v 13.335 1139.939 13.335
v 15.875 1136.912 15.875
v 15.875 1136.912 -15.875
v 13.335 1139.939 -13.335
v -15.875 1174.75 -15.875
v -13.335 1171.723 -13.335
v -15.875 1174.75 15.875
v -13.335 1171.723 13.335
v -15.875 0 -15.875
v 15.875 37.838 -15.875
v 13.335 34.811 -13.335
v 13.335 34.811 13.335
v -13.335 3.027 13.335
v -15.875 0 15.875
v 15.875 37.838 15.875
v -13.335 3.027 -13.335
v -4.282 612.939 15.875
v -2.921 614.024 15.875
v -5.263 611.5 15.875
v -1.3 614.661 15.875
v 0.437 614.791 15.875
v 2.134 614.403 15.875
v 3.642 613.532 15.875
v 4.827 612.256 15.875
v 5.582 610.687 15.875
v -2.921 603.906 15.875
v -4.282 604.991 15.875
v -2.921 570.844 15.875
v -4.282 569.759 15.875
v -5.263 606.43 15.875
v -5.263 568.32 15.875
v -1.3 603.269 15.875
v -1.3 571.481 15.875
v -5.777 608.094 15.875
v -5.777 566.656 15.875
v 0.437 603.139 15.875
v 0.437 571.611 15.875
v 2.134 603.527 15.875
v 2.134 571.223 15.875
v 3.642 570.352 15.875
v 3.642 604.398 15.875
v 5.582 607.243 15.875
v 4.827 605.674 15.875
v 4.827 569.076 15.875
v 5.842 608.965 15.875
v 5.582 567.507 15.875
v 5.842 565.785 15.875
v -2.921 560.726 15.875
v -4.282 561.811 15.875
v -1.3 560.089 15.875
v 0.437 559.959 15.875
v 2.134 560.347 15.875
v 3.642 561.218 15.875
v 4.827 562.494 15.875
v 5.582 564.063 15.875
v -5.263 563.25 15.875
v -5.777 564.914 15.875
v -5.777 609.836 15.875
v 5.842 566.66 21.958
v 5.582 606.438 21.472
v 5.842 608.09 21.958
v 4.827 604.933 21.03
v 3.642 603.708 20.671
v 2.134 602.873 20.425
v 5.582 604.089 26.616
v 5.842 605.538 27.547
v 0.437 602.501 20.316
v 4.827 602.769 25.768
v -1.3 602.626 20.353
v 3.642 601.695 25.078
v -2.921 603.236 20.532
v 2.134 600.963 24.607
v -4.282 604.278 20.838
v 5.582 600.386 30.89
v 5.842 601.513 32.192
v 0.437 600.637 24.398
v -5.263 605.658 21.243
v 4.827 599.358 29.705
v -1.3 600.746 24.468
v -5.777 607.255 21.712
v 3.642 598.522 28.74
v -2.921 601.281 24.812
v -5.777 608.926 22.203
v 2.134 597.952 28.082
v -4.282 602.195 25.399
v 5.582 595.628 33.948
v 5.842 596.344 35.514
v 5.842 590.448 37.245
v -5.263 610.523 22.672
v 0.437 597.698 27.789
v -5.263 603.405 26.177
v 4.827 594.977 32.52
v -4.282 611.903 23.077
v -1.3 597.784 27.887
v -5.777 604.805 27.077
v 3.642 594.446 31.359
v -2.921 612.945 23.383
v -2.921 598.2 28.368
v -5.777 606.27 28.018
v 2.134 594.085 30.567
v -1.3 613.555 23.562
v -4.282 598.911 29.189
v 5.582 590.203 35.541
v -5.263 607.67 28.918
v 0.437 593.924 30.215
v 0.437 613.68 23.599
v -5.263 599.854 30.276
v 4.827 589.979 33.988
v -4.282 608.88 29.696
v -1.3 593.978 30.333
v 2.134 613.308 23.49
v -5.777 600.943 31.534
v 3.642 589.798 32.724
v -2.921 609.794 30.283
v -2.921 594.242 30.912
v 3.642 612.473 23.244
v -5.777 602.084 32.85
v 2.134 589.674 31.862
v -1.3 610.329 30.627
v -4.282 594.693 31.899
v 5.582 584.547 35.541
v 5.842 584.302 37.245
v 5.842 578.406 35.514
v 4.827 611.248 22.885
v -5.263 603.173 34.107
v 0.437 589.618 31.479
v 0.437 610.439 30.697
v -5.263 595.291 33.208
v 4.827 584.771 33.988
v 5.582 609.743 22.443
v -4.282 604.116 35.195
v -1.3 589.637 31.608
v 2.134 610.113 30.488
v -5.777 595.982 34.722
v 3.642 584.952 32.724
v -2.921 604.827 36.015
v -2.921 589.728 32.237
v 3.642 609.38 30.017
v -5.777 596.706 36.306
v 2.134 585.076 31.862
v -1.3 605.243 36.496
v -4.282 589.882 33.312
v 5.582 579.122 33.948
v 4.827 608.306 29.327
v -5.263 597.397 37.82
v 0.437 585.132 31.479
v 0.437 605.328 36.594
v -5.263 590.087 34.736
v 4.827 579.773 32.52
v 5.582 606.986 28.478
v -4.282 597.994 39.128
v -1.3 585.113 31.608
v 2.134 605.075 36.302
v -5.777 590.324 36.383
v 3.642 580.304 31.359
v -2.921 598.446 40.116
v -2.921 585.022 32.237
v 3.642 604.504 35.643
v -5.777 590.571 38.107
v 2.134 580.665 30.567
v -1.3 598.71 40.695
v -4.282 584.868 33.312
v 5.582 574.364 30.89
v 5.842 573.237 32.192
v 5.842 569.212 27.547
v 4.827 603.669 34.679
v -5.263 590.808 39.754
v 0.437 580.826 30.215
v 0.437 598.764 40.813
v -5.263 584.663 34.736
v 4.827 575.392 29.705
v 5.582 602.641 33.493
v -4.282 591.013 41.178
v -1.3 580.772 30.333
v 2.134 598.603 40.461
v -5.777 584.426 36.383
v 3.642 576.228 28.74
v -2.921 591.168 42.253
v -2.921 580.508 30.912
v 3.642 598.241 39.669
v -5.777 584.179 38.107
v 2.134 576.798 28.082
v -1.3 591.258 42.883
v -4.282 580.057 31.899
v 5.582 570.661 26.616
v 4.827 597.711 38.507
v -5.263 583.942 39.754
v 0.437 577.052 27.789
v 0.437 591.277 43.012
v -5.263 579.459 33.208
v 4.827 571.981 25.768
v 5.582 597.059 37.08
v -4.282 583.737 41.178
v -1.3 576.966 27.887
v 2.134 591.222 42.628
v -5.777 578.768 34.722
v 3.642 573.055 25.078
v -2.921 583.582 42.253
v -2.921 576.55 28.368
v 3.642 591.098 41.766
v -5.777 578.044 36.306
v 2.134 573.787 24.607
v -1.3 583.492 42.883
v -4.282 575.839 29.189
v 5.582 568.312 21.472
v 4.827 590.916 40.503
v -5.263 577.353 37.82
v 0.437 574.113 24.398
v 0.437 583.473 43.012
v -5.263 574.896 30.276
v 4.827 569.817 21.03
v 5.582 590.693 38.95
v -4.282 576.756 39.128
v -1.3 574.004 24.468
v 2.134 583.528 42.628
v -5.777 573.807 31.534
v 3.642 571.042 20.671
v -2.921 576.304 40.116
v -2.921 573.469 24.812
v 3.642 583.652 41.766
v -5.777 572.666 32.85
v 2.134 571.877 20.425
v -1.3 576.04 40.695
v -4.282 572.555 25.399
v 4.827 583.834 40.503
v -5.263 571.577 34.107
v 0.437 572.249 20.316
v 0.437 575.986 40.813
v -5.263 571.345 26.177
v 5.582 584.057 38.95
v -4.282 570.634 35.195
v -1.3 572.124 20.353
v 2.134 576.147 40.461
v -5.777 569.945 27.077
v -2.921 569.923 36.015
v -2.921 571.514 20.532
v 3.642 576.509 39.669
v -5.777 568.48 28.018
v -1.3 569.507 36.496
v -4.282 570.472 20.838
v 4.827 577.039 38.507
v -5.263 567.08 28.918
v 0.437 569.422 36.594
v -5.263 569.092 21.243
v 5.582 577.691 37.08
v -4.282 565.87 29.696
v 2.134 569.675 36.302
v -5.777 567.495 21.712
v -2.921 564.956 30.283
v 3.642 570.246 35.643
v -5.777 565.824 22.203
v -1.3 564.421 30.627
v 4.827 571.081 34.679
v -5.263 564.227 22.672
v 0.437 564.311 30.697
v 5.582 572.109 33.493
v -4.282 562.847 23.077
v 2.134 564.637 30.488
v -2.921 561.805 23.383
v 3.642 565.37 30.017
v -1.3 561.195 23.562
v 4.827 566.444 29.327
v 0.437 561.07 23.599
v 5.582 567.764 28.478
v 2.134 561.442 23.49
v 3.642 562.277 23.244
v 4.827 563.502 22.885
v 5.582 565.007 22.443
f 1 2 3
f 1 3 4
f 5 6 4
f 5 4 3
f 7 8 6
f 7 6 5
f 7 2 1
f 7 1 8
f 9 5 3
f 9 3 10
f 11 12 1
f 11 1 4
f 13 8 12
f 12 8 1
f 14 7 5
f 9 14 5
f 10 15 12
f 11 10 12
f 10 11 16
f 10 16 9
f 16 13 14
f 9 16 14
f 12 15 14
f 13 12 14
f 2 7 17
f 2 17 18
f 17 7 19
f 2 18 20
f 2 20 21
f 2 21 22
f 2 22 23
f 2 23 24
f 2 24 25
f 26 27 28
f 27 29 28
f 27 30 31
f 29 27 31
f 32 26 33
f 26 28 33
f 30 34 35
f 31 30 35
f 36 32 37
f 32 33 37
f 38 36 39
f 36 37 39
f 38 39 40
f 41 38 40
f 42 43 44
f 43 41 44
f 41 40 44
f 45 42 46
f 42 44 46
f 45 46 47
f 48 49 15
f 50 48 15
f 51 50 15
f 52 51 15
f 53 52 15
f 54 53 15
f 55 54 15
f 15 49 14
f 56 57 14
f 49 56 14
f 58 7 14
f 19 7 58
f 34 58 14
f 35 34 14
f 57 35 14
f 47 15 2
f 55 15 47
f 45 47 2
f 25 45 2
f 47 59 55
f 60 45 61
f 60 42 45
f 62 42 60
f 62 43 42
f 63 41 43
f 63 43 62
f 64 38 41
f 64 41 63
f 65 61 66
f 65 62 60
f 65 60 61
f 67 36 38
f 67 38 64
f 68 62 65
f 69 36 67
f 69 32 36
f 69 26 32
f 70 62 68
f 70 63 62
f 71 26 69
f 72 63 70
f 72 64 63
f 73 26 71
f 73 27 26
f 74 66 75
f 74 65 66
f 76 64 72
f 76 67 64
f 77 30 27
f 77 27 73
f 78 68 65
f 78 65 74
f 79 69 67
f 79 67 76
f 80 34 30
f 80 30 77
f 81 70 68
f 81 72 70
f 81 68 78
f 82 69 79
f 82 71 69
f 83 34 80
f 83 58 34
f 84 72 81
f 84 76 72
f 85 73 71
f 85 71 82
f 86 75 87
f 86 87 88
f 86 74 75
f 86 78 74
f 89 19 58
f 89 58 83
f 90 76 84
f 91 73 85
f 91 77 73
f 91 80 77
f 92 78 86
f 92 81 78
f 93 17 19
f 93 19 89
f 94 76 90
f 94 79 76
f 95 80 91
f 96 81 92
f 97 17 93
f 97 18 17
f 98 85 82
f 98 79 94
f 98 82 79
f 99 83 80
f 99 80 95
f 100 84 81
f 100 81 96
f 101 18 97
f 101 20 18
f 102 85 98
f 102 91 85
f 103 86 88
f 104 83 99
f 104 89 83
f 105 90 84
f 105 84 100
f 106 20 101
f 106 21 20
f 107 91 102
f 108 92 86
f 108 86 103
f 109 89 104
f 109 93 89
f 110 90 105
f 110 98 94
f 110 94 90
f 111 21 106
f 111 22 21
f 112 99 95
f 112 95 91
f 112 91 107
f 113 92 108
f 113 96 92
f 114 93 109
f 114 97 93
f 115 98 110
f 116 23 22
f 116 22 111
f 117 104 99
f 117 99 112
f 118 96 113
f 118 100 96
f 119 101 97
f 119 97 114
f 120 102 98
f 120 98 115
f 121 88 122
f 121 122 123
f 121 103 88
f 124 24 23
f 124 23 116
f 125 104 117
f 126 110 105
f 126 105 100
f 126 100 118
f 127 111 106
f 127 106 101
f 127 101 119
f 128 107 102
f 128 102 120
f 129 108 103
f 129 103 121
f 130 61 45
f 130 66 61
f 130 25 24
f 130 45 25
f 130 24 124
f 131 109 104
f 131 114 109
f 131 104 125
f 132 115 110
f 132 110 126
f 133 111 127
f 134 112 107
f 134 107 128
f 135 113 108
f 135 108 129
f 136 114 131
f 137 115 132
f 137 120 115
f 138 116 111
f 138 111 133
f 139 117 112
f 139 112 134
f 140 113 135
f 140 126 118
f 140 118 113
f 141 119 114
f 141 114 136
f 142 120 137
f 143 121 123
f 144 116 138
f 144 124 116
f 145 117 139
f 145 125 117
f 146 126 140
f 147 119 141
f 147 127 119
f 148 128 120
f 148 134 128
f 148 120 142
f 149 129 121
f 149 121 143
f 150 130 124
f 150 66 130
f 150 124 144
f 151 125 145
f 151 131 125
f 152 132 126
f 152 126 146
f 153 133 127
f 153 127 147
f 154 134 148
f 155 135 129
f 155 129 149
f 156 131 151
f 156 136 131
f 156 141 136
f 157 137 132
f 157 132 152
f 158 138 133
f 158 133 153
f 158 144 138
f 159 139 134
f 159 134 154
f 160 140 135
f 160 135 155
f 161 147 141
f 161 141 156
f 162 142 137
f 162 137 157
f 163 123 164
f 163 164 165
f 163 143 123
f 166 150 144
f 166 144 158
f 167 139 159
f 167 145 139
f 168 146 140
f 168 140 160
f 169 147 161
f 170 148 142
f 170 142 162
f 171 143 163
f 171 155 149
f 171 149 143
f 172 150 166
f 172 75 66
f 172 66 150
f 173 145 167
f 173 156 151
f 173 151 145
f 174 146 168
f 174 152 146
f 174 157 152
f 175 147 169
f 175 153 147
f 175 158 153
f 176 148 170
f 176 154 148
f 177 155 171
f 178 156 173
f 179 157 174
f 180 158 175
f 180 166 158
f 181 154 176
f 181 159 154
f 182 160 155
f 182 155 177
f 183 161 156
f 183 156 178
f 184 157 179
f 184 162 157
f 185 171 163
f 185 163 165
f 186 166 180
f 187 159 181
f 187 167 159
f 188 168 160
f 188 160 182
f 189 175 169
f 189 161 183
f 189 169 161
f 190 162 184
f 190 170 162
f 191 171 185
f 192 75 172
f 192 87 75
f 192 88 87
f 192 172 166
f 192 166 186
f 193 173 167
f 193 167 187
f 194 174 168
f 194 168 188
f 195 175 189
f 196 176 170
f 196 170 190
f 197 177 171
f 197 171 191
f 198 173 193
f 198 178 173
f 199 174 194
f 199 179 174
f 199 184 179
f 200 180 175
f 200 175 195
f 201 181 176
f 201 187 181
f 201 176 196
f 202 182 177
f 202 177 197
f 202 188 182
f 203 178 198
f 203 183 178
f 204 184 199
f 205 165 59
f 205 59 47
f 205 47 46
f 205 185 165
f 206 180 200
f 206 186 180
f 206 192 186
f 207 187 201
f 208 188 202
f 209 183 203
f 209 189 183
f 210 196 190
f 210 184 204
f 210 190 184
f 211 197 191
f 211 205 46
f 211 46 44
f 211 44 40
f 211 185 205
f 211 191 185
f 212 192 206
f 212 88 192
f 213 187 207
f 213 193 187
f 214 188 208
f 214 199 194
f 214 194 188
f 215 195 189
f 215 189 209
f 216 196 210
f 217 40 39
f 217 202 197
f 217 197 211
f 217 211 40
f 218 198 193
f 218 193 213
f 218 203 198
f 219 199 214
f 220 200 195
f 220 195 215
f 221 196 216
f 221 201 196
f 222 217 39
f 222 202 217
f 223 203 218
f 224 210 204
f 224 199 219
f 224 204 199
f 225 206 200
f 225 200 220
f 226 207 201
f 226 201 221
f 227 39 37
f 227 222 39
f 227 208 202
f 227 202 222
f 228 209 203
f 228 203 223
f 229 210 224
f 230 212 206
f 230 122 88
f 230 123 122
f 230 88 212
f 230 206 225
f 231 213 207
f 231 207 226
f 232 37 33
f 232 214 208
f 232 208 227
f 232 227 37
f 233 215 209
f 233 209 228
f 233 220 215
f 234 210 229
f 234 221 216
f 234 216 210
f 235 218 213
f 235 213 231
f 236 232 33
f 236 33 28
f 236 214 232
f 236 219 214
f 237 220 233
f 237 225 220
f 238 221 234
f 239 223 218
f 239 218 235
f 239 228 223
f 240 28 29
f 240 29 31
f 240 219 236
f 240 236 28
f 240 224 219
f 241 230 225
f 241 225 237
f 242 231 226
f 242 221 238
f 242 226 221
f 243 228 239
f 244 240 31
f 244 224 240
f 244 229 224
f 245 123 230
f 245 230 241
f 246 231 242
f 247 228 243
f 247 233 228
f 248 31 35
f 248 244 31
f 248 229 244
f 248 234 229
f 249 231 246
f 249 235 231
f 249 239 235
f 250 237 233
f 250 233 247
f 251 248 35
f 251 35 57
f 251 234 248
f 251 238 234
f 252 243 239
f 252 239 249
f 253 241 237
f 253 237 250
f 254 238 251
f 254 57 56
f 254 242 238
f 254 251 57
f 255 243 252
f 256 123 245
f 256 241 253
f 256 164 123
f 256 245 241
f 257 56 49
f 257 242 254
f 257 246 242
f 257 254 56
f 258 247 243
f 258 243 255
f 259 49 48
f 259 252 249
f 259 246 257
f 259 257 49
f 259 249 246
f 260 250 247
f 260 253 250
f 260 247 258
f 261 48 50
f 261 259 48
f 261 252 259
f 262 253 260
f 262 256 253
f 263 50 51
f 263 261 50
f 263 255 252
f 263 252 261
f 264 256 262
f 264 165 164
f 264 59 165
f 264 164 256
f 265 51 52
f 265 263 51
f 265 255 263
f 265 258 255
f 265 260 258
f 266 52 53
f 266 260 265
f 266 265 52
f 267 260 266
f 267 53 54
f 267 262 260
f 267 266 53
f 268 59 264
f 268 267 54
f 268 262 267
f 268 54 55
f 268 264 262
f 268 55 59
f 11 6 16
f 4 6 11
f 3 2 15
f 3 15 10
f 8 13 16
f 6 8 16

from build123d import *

# Parameters (mm, degrees)
SKETCH2_W           = 31.75
SKETCH2_H           = 31.75
SKETCH2_W_2         = 26.67
SKETCH2_H_2         = 26.67
BOSS_EXTRUDE1_DEPTH = 1174.75
CUT_EXTRUDE1_DEPTH  = 1176.286195199
SKETCH8_R           = 5.842


with BuildPart() as part:
    # Sketch2 → Boss-Extrude1 (new body)
    with BuildSketch(Plane(origin=(0, 0, 0), x_dir=(1, 0, 0), z_dir=(0, 1, 0))):
        Rectangle(SKETCH2_W, SKETCH2_H)
        Rectangle(SKETCH2_W_2, SKETCH2_H_2, mode=Mode.SUBTRACT)
    extrude(amount=BOSS_EXTRUDE1_DEPTH)

    # Sketch4 → Cut-Extrude1 (cut, through all)
    with BuildSketch(Plane.XY.offset(15.875)):
        Polygon((15.875, 0), (15.875, 37.838176565), (-15.875, 0), align=None)
        Polygon((15.875, 1174.75), (15.875, 1136.911823435), (-15.875, 1174.75), align=None)
    extrude(amount=-CUT_EXTRUDE1_DEPTH, mode=Mode.SUBTRACT)

    # Sweep2: sweep along a path in Sketch7
    with BuildLine(Plane(origin=(0, 0, 0), x_dir=(0, 0, -1), z_dir=(1, 0, 0))) as sweep2_path:
        ThreePointArc((-15.875, 608.965), (-37.465, 587.375), (-15.875, 565.785))
    # Sketch8 → Sweep2 (sweep)
    with BuildSketch(Plane.XY.offset(15.875)):
        with Locations((0, 608.965)):
            Circle(SKETCH8_R)
    sweep(path=sweep2_path.line)


solid = part.part
